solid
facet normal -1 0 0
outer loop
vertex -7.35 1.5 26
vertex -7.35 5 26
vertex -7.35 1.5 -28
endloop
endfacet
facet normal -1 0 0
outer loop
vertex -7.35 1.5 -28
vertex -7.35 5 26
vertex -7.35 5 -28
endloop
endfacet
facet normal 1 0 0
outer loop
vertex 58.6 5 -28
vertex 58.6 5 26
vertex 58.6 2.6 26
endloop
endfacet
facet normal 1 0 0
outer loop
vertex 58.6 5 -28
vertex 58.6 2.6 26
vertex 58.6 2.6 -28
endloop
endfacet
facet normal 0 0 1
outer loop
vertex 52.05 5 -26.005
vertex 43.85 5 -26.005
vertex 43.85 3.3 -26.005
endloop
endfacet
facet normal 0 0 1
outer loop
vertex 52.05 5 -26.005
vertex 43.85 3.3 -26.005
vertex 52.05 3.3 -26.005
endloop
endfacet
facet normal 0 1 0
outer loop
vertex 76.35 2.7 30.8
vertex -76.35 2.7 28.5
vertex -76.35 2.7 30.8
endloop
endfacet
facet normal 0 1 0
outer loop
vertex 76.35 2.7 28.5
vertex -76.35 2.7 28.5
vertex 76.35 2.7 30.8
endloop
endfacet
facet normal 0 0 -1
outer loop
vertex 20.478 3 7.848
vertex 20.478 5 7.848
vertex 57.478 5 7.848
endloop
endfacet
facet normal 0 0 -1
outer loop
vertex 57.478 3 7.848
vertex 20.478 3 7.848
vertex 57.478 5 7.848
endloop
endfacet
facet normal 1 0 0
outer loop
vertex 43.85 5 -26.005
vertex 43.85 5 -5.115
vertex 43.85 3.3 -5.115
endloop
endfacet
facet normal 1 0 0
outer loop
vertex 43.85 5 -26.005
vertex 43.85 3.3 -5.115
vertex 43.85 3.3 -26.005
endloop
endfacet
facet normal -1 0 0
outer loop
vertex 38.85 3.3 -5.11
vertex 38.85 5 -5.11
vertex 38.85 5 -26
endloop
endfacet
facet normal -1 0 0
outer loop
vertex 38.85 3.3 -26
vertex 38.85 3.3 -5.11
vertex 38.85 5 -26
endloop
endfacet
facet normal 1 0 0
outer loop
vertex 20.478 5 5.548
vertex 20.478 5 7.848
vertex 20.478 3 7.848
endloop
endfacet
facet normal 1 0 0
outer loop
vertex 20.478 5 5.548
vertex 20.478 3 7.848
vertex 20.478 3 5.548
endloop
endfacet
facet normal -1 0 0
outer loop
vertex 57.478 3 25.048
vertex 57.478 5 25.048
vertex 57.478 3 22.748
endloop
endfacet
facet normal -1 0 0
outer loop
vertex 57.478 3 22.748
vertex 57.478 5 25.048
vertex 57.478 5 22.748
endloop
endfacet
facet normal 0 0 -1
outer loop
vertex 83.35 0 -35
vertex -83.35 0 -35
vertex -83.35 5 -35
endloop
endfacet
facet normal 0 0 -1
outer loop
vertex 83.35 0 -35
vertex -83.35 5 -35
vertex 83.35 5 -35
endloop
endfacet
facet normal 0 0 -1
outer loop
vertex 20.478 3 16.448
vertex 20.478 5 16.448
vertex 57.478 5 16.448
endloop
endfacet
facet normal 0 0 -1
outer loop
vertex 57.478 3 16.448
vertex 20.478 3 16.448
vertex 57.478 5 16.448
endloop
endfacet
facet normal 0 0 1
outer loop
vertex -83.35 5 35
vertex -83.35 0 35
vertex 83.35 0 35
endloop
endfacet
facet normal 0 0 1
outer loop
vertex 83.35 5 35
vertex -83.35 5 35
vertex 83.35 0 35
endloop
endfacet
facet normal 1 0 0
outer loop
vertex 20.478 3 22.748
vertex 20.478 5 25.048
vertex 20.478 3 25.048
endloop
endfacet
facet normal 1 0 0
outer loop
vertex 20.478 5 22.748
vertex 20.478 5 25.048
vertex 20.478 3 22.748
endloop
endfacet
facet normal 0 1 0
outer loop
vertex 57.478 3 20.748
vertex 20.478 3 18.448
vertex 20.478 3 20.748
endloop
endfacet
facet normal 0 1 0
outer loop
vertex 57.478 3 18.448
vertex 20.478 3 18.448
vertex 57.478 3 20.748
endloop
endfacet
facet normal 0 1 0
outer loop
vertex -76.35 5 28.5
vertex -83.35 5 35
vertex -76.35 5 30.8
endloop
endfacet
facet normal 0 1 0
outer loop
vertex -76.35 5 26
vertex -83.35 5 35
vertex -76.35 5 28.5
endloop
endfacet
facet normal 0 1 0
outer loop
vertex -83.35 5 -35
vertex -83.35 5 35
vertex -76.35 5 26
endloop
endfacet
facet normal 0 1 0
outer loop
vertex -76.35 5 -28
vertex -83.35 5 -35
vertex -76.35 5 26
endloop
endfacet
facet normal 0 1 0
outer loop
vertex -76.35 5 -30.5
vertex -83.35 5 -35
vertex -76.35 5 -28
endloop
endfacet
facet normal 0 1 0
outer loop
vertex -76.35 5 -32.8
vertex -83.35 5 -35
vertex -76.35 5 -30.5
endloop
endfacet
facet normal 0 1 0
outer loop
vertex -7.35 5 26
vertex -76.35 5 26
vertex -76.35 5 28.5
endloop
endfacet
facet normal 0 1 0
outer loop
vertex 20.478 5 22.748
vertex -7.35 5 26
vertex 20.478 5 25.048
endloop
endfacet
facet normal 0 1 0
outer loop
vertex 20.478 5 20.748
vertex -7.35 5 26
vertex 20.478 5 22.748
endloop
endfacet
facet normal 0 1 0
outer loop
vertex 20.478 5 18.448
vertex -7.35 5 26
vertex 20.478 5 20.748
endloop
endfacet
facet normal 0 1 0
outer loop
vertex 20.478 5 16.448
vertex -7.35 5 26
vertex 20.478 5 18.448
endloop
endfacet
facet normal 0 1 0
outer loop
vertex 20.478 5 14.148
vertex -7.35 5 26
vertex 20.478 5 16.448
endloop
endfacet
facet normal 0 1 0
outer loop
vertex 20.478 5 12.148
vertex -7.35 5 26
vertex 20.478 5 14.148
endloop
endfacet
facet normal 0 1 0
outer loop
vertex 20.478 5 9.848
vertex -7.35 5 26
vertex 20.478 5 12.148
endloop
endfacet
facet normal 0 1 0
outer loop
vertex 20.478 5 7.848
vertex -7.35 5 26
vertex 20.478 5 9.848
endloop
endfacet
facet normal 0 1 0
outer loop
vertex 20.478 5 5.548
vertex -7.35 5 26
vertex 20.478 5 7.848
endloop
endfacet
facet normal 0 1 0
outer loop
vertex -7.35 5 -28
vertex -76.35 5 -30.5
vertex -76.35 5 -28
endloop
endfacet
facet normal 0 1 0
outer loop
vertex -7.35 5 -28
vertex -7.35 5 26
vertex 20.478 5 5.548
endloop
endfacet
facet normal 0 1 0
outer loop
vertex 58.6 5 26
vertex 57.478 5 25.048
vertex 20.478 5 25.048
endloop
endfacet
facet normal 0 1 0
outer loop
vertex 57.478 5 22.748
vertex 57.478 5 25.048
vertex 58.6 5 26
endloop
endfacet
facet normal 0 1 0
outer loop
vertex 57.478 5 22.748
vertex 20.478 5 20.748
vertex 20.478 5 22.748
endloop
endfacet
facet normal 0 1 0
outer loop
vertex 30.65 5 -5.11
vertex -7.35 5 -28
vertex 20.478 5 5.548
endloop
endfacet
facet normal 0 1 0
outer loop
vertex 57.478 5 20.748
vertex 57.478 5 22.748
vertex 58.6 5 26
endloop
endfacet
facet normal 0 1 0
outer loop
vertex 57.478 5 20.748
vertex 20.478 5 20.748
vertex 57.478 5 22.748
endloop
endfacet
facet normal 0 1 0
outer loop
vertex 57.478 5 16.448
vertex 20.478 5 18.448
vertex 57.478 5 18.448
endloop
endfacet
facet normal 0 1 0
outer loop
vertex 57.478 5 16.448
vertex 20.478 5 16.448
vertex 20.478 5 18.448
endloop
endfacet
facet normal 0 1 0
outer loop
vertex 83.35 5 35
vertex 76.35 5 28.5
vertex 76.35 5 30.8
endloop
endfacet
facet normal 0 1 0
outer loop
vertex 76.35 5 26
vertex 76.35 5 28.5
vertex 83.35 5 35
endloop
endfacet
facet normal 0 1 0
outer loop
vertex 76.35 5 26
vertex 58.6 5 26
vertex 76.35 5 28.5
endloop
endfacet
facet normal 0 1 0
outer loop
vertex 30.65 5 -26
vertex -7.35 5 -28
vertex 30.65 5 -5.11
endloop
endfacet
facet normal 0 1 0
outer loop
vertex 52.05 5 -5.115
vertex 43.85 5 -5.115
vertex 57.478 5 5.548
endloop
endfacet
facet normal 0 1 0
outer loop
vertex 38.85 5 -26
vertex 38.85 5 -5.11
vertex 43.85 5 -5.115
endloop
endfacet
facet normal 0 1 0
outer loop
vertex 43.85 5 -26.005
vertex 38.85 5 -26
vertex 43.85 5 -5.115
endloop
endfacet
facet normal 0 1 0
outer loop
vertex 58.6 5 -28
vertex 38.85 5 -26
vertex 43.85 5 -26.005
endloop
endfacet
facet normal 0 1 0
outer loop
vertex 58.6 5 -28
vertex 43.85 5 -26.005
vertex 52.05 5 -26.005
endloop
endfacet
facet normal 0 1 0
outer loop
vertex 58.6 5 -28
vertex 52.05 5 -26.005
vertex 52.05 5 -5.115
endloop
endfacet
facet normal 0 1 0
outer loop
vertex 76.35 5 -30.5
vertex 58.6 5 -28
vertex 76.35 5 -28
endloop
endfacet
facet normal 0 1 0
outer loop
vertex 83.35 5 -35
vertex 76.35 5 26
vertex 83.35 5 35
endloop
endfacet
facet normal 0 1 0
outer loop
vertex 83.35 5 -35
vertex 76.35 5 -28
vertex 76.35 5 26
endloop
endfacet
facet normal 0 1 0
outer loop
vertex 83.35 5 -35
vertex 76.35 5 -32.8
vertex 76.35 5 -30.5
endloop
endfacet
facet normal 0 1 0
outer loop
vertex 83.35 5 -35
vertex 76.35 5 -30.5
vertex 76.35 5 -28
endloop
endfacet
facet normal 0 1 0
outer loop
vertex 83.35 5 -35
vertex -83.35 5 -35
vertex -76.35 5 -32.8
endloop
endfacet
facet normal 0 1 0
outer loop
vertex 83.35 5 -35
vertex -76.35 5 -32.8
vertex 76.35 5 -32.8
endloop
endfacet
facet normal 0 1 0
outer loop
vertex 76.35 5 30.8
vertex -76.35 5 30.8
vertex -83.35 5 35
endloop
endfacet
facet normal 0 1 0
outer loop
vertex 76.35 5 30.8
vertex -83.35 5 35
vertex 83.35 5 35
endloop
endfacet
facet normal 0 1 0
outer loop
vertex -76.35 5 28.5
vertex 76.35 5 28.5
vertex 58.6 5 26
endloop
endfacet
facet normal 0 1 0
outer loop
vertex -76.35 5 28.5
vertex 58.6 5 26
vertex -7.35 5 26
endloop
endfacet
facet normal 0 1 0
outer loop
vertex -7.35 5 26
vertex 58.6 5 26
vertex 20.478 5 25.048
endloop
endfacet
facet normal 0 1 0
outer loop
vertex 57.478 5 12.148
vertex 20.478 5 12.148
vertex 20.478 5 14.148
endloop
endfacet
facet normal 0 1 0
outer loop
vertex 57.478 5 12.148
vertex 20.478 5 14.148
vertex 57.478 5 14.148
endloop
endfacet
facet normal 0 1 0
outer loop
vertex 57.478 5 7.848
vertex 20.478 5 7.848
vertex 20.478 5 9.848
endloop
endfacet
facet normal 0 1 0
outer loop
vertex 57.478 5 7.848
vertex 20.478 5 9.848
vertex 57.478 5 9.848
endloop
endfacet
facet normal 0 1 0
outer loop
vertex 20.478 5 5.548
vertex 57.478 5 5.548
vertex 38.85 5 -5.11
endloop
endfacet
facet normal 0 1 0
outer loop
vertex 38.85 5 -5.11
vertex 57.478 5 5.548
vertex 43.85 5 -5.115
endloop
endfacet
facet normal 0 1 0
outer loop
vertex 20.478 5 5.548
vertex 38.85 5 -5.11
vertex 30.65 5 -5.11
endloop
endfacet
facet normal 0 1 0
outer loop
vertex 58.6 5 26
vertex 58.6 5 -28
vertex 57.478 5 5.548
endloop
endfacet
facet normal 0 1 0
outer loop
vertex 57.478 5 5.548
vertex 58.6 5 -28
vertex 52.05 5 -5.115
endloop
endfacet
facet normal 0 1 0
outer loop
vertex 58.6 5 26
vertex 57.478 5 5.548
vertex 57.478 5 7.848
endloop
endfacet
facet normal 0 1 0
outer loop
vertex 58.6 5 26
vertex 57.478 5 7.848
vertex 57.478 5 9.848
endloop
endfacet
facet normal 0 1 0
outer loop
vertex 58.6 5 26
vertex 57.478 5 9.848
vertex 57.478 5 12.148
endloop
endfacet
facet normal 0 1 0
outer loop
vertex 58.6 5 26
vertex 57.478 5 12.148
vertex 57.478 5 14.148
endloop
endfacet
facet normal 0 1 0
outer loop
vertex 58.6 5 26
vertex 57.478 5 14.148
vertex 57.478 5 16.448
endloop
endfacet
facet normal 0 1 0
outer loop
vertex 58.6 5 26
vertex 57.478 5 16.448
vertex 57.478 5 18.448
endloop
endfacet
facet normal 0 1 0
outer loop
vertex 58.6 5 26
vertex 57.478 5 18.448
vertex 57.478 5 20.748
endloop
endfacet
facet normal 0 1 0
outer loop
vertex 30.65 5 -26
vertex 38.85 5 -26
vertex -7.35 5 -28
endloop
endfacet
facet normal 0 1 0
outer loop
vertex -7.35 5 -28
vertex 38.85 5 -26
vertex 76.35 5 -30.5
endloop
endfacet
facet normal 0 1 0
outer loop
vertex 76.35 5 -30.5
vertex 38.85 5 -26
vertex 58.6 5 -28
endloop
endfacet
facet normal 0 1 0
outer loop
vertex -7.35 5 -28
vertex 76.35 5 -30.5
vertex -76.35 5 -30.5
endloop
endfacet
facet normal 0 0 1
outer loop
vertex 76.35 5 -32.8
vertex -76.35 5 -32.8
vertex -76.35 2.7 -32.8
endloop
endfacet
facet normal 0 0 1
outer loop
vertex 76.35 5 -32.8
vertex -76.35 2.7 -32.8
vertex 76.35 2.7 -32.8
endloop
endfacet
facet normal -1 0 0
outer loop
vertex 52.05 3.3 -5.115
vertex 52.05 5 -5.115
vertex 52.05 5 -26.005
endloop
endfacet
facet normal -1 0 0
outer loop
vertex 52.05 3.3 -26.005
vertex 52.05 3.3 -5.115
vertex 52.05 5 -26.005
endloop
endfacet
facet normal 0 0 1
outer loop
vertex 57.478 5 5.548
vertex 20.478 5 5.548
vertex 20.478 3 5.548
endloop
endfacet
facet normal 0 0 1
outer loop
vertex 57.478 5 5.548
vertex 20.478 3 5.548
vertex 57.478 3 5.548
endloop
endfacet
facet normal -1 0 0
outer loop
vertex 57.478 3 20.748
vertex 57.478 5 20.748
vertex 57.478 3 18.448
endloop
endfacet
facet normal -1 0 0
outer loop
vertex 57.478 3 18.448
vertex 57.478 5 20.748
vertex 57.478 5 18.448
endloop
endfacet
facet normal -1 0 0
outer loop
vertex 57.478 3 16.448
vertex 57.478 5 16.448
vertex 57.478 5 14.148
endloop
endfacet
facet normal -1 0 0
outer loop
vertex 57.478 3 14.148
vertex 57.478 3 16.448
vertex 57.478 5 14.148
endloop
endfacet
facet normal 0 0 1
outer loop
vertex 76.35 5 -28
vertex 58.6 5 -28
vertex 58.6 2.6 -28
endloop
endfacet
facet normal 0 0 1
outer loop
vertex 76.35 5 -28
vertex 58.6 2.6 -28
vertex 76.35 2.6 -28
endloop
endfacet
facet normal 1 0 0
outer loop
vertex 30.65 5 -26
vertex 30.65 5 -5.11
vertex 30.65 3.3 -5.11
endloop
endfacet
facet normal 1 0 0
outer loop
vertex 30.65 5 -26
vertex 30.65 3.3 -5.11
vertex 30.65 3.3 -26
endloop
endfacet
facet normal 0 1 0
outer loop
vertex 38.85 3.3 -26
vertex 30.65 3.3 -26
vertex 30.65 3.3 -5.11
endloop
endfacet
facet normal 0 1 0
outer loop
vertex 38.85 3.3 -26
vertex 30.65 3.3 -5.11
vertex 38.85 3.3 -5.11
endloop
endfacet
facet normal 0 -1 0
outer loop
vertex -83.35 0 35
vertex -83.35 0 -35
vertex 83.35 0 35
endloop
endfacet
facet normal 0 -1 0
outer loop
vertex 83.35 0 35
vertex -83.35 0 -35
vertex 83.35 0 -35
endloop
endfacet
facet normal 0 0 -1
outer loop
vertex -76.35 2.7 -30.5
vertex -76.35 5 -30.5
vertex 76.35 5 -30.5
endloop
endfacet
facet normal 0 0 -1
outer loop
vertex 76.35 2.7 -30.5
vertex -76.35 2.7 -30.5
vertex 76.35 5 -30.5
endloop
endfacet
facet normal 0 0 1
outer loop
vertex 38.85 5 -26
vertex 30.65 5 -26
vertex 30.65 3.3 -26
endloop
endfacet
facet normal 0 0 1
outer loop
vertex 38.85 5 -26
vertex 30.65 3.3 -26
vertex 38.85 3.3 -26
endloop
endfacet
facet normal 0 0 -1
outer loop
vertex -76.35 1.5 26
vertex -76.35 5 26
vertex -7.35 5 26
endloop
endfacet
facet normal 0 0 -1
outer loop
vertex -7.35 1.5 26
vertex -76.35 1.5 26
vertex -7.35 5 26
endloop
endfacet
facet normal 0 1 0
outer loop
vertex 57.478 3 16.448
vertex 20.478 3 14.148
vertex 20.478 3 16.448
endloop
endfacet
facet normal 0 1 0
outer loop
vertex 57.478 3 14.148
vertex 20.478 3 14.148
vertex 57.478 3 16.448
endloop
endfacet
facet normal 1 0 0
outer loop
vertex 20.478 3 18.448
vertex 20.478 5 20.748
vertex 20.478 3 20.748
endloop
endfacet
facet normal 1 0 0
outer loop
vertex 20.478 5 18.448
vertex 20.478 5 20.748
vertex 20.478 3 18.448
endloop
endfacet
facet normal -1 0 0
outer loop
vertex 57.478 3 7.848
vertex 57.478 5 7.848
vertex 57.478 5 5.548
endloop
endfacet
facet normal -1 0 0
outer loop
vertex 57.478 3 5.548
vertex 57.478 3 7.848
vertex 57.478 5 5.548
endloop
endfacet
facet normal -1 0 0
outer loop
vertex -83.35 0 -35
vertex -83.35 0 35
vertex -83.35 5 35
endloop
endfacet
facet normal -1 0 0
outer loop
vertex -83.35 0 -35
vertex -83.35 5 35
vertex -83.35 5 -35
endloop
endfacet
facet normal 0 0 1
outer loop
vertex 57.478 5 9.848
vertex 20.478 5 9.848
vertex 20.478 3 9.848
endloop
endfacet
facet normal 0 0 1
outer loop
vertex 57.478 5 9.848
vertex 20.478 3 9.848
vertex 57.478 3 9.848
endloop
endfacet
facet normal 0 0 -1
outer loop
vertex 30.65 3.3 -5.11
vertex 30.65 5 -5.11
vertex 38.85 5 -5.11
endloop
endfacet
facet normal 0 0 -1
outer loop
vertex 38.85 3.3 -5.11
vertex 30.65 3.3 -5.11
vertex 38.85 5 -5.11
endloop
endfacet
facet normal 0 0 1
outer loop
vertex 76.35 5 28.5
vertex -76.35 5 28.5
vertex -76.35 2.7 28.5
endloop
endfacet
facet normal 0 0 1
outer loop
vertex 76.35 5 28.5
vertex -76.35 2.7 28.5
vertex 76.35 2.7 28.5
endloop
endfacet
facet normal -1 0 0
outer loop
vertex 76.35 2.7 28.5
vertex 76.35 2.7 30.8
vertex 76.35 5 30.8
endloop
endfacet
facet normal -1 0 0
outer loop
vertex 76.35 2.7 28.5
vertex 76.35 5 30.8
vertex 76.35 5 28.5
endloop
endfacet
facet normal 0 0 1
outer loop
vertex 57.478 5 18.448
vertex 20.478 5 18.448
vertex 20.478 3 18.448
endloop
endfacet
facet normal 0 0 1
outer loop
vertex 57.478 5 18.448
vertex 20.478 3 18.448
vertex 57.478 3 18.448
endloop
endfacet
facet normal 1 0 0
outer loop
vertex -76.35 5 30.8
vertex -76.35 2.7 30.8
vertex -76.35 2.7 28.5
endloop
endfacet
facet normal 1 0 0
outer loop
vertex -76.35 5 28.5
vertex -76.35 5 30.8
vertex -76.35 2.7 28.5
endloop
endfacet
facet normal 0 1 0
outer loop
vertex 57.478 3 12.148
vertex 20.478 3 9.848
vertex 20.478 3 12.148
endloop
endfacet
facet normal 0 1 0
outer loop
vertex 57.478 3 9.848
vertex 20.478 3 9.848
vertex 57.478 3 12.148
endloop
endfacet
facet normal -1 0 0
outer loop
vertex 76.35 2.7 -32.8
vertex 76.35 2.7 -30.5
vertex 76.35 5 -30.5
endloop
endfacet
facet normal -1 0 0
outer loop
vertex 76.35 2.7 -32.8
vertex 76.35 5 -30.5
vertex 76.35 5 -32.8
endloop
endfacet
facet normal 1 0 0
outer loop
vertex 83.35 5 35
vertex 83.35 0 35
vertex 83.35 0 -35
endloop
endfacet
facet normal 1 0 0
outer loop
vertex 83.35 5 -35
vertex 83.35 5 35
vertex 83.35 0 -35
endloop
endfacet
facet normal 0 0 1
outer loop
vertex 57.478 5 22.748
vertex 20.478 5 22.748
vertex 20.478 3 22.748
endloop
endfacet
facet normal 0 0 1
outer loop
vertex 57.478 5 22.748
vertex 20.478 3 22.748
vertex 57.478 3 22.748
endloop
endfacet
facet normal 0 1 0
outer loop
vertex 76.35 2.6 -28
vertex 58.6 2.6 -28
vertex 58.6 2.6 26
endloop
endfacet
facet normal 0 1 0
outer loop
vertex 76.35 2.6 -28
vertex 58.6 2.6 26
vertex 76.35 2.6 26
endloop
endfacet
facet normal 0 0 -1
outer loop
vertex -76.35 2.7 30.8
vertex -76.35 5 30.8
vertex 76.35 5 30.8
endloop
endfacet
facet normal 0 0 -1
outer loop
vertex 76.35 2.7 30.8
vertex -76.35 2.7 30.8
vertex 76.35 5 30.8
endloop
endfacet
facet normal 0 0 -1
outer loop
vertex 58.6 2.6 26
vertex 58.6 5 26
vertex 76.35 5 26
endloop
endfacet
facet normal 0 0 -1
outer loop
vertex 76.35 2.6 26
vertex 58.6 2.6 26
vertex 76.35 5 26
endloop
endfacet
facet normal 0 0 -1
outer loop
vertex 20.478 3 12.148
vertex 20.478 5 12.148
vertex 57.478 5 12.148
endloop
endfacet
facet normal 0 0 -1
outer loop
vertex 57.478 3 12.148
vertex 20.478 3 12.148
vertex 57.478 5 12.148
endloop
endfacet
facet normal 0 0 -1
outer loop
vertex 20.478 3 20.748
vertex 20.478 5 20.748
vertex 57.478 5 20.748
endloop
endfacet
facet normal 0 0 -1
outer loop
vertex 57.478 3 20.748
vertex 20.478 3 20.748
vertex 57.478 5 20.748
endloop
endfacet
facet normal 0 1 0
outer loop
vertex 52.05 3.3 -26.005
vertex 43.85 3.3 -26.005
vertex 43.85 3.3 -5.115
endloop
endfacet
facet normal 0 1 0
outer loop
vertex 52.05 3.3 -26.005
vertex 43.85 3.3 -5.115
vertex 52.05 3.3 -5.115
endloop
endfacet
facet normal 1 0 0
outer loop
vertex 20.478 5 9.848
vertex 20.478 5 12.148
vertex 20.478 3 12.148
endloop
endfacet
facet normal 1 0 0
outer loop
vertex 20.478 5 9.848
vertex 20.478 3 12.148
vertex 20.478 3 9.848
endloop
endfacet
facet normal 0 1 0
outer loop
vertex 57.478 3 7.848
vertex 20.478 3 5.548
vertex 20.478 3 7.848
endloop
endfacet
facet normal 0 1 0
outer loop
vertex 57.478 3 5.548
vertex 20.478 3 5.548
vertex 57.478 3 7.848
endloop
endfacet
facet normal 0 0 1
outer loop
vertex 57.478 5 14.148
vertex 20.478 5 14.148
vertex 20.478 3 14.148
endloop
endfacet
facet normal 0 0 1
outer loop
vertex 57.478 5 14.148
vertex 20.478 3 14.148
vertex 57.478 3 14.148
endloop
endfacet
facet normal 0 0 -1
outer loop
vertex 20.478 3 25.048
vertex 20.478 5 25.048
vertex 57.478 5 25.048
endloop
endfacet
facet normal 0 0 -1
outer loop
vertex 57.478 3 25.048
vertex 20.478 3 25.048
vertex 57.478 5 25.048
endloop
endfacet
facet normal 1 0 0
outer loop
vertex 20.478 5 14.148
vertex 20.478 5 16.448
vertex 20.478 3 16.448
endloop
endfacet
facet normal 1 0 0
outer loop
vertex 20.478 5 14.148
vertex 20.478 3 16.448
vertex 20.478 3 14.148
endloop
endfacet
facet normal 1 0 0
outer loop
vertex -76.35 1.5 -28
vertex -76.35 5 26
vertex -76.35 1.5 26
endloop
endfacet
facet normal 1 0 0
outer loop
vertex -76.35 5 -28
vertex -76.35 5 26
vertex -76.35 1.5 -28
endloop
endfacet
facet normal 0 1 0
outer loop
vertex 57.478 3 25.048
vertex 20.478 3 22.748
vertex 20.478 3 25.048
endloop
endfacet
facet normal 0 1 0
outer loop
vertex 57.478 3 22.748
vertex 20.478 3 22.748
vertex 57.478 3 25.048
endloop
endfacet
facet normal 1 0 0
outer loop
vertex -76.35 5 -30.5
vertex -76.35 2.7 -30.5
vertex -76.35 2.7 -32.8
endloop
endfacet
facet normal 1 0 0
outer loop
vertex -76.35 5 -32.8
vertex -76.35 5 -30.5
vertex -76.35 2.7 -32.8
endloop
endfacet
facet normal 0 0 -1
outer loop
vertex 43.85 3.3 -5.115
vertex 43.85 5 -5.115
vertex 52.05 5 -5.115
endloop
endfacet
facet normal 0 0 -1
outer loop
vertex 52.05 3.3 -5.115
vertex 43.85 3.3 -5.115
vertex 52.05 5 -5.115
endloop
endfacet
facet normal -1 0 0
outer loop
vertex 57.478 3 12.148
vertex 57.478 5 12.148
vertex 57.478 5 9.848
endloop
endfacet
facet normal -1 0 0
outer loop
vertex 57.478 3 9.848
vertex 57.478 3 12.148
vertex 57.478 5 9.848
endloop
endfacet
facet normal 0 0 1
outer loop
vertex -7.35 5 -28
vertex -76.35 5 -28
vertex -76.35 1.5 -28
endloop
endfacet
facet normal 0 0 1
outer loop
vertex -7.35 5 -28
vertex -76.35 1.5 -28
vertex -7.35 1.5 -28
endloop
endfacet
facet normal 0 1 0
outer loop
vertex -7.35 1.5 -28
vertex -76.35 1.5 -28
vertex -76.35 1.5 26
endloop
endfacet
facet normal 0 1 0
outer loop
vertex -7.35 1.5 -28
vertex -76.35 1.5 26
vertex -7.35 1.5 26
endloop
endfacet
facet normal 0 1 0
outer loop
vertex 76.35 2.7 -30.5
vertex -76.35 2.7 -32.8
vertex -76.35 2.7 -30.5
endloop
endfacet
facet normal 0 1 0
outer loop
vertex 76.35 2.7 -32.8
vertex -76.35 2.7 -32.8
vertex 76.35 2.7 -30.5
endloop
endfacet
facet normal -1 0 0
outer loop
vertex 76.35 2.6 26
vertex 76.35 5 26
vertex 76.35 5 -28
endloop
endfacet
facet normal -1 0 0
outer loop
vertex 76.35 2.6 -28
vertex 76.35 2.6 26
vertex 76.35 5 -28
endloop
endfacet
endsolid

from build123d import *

# Parameters (mm, degrees)
SKETCH1_W           = 166.7
SKETCH1_H           = 70
BOSS_EXTRUDE2_DEPTH = 5
SKETCH2_W           = 69
SKETCH2_H           = 54
CUT_EXTRUDE1_DEPTH  = 3.5
SKETCH4_W           = 8.2
SKETCH4_H           = 20.89
CUT_EXTRUDE3_DEPTH  = 1.7
SKETCH3_W           = 17.75
SKETCH3_H           = 54
CUT_EXTRUDE4_DEPTH  = 2.4
SKETCH5_W           = 152.7
SKETCH5_H           = 2.3
CUT_EXTRUDE5_DEPTH  = 2.3
SKETCH6_W           = 37
SKETCH6_H           = 2.3
CUT_EXTRUDE7_DEPTH  = 2


with BuildPart() as part:
    # Sketch1 → Boss-Extrude2 (new body)
    with BuildSketch(Plane(origin=(0, 0, 0), x_dir=(1, 0, 0), z_dir=(0, 1, 0))):
        Rectangle(SKETCH1_W, SKETCH1_H)
    extrude(amount=BOSS_EXTRUDE2_DEPTH)

    # Sketch2 → Cut-Extrude1 (cut)
    with BuildSketch(Plane(origin=(0, 5, 0), x_dir=(1, 0, 0), z_dir=(0, 1, 0))):
        with Locations((-41.85, 1)):
            Rectangle(SKETCH2_W, SKETCH2_H)
    extrude(amount=-CUT_EXTRUDE1_DEPTH, mode=Mode.SUBTRACT)

    # Sketch4 → Cut-Extrude3 (cut)
    with BuildSketch(Plane(origin=(0, 5, 0), x_dir=(1, 0, 0), z_dir=(0, 1, 0))):
        with Locations((34.75, 15.555)):
            Rectangle(SKETCH4_W, SKETCH4_H)
        with Locations((47.95, 15.559824889)):
            Rectangle(SKETCH4_W, SKETCH4_H)
    extrude(amount=-CUT_EXTRUDE3_DEPTH, mode=Mode.SUBTRACT)

    # Sketch3 → Cut-Extrude4 (cut)
    with BuildSketch(Plane(origin=(0, 5, 0), x_dir=(1, 0, 0), z_dir=(0, 1, 0))):
        with Locations((67.475, 1)):
            Rectangle(SKETCH3_W, SKETCH3_H)
    extrude(amount=-CUT_EXTRUDE4_DEPTH, mode=Mode.SUBTRACT)

    # Sketch5 → Cut-Extrude5 (cut)
    with BuildSketch(Plane(origin=(0, 5, 0), x_dir=(1, 0, 0), z_dir=(0, 1, 0))):
        with Locations((0, -29.65)):
            Rectangle(SKETCH5_W, SKETCH5_H)
        with Locations((0, 31.65)):
            Rectangle(SKETCH5_W, SKETCH5_H)
    extrude(amount=-CUT_EXTRUDE5_DEPTH, mode=Mode.SUBTRACT)

    # Sketch6 → Cut-Extrude7 (cut)
    with BuildSketch(Plane(origin=(0, 5, 0), x_dir=(1, 0, 0), z_dir=(0, 1, 0))):
        with Locations((38.977751303, -19.59833207)):
            Rectangle(SKETCH6_W, SKETCH6_H)
        with Locations((38.977751303, -15.29833207)):
            Rectangle(SKETCH6_W, SKETCH6_H)
        with Locations((38.977751303, -10.99833207)):
            Rectangle(SKETCH6_W, SKETCH6_H)
        with Locations((38.977751303, -6.69833207)):
            Rectangle(SKETCH6_W, SKETCH6_H)
        with Locations((38.977751303, -23.89833207)):
            Rectangle(SKETCH6_W, SKETCH6_H)
    extrude(amount=-CUT_EXTRUDE7_DEPTH, mode=Mode.SUBTRACT)


solid = part.part
